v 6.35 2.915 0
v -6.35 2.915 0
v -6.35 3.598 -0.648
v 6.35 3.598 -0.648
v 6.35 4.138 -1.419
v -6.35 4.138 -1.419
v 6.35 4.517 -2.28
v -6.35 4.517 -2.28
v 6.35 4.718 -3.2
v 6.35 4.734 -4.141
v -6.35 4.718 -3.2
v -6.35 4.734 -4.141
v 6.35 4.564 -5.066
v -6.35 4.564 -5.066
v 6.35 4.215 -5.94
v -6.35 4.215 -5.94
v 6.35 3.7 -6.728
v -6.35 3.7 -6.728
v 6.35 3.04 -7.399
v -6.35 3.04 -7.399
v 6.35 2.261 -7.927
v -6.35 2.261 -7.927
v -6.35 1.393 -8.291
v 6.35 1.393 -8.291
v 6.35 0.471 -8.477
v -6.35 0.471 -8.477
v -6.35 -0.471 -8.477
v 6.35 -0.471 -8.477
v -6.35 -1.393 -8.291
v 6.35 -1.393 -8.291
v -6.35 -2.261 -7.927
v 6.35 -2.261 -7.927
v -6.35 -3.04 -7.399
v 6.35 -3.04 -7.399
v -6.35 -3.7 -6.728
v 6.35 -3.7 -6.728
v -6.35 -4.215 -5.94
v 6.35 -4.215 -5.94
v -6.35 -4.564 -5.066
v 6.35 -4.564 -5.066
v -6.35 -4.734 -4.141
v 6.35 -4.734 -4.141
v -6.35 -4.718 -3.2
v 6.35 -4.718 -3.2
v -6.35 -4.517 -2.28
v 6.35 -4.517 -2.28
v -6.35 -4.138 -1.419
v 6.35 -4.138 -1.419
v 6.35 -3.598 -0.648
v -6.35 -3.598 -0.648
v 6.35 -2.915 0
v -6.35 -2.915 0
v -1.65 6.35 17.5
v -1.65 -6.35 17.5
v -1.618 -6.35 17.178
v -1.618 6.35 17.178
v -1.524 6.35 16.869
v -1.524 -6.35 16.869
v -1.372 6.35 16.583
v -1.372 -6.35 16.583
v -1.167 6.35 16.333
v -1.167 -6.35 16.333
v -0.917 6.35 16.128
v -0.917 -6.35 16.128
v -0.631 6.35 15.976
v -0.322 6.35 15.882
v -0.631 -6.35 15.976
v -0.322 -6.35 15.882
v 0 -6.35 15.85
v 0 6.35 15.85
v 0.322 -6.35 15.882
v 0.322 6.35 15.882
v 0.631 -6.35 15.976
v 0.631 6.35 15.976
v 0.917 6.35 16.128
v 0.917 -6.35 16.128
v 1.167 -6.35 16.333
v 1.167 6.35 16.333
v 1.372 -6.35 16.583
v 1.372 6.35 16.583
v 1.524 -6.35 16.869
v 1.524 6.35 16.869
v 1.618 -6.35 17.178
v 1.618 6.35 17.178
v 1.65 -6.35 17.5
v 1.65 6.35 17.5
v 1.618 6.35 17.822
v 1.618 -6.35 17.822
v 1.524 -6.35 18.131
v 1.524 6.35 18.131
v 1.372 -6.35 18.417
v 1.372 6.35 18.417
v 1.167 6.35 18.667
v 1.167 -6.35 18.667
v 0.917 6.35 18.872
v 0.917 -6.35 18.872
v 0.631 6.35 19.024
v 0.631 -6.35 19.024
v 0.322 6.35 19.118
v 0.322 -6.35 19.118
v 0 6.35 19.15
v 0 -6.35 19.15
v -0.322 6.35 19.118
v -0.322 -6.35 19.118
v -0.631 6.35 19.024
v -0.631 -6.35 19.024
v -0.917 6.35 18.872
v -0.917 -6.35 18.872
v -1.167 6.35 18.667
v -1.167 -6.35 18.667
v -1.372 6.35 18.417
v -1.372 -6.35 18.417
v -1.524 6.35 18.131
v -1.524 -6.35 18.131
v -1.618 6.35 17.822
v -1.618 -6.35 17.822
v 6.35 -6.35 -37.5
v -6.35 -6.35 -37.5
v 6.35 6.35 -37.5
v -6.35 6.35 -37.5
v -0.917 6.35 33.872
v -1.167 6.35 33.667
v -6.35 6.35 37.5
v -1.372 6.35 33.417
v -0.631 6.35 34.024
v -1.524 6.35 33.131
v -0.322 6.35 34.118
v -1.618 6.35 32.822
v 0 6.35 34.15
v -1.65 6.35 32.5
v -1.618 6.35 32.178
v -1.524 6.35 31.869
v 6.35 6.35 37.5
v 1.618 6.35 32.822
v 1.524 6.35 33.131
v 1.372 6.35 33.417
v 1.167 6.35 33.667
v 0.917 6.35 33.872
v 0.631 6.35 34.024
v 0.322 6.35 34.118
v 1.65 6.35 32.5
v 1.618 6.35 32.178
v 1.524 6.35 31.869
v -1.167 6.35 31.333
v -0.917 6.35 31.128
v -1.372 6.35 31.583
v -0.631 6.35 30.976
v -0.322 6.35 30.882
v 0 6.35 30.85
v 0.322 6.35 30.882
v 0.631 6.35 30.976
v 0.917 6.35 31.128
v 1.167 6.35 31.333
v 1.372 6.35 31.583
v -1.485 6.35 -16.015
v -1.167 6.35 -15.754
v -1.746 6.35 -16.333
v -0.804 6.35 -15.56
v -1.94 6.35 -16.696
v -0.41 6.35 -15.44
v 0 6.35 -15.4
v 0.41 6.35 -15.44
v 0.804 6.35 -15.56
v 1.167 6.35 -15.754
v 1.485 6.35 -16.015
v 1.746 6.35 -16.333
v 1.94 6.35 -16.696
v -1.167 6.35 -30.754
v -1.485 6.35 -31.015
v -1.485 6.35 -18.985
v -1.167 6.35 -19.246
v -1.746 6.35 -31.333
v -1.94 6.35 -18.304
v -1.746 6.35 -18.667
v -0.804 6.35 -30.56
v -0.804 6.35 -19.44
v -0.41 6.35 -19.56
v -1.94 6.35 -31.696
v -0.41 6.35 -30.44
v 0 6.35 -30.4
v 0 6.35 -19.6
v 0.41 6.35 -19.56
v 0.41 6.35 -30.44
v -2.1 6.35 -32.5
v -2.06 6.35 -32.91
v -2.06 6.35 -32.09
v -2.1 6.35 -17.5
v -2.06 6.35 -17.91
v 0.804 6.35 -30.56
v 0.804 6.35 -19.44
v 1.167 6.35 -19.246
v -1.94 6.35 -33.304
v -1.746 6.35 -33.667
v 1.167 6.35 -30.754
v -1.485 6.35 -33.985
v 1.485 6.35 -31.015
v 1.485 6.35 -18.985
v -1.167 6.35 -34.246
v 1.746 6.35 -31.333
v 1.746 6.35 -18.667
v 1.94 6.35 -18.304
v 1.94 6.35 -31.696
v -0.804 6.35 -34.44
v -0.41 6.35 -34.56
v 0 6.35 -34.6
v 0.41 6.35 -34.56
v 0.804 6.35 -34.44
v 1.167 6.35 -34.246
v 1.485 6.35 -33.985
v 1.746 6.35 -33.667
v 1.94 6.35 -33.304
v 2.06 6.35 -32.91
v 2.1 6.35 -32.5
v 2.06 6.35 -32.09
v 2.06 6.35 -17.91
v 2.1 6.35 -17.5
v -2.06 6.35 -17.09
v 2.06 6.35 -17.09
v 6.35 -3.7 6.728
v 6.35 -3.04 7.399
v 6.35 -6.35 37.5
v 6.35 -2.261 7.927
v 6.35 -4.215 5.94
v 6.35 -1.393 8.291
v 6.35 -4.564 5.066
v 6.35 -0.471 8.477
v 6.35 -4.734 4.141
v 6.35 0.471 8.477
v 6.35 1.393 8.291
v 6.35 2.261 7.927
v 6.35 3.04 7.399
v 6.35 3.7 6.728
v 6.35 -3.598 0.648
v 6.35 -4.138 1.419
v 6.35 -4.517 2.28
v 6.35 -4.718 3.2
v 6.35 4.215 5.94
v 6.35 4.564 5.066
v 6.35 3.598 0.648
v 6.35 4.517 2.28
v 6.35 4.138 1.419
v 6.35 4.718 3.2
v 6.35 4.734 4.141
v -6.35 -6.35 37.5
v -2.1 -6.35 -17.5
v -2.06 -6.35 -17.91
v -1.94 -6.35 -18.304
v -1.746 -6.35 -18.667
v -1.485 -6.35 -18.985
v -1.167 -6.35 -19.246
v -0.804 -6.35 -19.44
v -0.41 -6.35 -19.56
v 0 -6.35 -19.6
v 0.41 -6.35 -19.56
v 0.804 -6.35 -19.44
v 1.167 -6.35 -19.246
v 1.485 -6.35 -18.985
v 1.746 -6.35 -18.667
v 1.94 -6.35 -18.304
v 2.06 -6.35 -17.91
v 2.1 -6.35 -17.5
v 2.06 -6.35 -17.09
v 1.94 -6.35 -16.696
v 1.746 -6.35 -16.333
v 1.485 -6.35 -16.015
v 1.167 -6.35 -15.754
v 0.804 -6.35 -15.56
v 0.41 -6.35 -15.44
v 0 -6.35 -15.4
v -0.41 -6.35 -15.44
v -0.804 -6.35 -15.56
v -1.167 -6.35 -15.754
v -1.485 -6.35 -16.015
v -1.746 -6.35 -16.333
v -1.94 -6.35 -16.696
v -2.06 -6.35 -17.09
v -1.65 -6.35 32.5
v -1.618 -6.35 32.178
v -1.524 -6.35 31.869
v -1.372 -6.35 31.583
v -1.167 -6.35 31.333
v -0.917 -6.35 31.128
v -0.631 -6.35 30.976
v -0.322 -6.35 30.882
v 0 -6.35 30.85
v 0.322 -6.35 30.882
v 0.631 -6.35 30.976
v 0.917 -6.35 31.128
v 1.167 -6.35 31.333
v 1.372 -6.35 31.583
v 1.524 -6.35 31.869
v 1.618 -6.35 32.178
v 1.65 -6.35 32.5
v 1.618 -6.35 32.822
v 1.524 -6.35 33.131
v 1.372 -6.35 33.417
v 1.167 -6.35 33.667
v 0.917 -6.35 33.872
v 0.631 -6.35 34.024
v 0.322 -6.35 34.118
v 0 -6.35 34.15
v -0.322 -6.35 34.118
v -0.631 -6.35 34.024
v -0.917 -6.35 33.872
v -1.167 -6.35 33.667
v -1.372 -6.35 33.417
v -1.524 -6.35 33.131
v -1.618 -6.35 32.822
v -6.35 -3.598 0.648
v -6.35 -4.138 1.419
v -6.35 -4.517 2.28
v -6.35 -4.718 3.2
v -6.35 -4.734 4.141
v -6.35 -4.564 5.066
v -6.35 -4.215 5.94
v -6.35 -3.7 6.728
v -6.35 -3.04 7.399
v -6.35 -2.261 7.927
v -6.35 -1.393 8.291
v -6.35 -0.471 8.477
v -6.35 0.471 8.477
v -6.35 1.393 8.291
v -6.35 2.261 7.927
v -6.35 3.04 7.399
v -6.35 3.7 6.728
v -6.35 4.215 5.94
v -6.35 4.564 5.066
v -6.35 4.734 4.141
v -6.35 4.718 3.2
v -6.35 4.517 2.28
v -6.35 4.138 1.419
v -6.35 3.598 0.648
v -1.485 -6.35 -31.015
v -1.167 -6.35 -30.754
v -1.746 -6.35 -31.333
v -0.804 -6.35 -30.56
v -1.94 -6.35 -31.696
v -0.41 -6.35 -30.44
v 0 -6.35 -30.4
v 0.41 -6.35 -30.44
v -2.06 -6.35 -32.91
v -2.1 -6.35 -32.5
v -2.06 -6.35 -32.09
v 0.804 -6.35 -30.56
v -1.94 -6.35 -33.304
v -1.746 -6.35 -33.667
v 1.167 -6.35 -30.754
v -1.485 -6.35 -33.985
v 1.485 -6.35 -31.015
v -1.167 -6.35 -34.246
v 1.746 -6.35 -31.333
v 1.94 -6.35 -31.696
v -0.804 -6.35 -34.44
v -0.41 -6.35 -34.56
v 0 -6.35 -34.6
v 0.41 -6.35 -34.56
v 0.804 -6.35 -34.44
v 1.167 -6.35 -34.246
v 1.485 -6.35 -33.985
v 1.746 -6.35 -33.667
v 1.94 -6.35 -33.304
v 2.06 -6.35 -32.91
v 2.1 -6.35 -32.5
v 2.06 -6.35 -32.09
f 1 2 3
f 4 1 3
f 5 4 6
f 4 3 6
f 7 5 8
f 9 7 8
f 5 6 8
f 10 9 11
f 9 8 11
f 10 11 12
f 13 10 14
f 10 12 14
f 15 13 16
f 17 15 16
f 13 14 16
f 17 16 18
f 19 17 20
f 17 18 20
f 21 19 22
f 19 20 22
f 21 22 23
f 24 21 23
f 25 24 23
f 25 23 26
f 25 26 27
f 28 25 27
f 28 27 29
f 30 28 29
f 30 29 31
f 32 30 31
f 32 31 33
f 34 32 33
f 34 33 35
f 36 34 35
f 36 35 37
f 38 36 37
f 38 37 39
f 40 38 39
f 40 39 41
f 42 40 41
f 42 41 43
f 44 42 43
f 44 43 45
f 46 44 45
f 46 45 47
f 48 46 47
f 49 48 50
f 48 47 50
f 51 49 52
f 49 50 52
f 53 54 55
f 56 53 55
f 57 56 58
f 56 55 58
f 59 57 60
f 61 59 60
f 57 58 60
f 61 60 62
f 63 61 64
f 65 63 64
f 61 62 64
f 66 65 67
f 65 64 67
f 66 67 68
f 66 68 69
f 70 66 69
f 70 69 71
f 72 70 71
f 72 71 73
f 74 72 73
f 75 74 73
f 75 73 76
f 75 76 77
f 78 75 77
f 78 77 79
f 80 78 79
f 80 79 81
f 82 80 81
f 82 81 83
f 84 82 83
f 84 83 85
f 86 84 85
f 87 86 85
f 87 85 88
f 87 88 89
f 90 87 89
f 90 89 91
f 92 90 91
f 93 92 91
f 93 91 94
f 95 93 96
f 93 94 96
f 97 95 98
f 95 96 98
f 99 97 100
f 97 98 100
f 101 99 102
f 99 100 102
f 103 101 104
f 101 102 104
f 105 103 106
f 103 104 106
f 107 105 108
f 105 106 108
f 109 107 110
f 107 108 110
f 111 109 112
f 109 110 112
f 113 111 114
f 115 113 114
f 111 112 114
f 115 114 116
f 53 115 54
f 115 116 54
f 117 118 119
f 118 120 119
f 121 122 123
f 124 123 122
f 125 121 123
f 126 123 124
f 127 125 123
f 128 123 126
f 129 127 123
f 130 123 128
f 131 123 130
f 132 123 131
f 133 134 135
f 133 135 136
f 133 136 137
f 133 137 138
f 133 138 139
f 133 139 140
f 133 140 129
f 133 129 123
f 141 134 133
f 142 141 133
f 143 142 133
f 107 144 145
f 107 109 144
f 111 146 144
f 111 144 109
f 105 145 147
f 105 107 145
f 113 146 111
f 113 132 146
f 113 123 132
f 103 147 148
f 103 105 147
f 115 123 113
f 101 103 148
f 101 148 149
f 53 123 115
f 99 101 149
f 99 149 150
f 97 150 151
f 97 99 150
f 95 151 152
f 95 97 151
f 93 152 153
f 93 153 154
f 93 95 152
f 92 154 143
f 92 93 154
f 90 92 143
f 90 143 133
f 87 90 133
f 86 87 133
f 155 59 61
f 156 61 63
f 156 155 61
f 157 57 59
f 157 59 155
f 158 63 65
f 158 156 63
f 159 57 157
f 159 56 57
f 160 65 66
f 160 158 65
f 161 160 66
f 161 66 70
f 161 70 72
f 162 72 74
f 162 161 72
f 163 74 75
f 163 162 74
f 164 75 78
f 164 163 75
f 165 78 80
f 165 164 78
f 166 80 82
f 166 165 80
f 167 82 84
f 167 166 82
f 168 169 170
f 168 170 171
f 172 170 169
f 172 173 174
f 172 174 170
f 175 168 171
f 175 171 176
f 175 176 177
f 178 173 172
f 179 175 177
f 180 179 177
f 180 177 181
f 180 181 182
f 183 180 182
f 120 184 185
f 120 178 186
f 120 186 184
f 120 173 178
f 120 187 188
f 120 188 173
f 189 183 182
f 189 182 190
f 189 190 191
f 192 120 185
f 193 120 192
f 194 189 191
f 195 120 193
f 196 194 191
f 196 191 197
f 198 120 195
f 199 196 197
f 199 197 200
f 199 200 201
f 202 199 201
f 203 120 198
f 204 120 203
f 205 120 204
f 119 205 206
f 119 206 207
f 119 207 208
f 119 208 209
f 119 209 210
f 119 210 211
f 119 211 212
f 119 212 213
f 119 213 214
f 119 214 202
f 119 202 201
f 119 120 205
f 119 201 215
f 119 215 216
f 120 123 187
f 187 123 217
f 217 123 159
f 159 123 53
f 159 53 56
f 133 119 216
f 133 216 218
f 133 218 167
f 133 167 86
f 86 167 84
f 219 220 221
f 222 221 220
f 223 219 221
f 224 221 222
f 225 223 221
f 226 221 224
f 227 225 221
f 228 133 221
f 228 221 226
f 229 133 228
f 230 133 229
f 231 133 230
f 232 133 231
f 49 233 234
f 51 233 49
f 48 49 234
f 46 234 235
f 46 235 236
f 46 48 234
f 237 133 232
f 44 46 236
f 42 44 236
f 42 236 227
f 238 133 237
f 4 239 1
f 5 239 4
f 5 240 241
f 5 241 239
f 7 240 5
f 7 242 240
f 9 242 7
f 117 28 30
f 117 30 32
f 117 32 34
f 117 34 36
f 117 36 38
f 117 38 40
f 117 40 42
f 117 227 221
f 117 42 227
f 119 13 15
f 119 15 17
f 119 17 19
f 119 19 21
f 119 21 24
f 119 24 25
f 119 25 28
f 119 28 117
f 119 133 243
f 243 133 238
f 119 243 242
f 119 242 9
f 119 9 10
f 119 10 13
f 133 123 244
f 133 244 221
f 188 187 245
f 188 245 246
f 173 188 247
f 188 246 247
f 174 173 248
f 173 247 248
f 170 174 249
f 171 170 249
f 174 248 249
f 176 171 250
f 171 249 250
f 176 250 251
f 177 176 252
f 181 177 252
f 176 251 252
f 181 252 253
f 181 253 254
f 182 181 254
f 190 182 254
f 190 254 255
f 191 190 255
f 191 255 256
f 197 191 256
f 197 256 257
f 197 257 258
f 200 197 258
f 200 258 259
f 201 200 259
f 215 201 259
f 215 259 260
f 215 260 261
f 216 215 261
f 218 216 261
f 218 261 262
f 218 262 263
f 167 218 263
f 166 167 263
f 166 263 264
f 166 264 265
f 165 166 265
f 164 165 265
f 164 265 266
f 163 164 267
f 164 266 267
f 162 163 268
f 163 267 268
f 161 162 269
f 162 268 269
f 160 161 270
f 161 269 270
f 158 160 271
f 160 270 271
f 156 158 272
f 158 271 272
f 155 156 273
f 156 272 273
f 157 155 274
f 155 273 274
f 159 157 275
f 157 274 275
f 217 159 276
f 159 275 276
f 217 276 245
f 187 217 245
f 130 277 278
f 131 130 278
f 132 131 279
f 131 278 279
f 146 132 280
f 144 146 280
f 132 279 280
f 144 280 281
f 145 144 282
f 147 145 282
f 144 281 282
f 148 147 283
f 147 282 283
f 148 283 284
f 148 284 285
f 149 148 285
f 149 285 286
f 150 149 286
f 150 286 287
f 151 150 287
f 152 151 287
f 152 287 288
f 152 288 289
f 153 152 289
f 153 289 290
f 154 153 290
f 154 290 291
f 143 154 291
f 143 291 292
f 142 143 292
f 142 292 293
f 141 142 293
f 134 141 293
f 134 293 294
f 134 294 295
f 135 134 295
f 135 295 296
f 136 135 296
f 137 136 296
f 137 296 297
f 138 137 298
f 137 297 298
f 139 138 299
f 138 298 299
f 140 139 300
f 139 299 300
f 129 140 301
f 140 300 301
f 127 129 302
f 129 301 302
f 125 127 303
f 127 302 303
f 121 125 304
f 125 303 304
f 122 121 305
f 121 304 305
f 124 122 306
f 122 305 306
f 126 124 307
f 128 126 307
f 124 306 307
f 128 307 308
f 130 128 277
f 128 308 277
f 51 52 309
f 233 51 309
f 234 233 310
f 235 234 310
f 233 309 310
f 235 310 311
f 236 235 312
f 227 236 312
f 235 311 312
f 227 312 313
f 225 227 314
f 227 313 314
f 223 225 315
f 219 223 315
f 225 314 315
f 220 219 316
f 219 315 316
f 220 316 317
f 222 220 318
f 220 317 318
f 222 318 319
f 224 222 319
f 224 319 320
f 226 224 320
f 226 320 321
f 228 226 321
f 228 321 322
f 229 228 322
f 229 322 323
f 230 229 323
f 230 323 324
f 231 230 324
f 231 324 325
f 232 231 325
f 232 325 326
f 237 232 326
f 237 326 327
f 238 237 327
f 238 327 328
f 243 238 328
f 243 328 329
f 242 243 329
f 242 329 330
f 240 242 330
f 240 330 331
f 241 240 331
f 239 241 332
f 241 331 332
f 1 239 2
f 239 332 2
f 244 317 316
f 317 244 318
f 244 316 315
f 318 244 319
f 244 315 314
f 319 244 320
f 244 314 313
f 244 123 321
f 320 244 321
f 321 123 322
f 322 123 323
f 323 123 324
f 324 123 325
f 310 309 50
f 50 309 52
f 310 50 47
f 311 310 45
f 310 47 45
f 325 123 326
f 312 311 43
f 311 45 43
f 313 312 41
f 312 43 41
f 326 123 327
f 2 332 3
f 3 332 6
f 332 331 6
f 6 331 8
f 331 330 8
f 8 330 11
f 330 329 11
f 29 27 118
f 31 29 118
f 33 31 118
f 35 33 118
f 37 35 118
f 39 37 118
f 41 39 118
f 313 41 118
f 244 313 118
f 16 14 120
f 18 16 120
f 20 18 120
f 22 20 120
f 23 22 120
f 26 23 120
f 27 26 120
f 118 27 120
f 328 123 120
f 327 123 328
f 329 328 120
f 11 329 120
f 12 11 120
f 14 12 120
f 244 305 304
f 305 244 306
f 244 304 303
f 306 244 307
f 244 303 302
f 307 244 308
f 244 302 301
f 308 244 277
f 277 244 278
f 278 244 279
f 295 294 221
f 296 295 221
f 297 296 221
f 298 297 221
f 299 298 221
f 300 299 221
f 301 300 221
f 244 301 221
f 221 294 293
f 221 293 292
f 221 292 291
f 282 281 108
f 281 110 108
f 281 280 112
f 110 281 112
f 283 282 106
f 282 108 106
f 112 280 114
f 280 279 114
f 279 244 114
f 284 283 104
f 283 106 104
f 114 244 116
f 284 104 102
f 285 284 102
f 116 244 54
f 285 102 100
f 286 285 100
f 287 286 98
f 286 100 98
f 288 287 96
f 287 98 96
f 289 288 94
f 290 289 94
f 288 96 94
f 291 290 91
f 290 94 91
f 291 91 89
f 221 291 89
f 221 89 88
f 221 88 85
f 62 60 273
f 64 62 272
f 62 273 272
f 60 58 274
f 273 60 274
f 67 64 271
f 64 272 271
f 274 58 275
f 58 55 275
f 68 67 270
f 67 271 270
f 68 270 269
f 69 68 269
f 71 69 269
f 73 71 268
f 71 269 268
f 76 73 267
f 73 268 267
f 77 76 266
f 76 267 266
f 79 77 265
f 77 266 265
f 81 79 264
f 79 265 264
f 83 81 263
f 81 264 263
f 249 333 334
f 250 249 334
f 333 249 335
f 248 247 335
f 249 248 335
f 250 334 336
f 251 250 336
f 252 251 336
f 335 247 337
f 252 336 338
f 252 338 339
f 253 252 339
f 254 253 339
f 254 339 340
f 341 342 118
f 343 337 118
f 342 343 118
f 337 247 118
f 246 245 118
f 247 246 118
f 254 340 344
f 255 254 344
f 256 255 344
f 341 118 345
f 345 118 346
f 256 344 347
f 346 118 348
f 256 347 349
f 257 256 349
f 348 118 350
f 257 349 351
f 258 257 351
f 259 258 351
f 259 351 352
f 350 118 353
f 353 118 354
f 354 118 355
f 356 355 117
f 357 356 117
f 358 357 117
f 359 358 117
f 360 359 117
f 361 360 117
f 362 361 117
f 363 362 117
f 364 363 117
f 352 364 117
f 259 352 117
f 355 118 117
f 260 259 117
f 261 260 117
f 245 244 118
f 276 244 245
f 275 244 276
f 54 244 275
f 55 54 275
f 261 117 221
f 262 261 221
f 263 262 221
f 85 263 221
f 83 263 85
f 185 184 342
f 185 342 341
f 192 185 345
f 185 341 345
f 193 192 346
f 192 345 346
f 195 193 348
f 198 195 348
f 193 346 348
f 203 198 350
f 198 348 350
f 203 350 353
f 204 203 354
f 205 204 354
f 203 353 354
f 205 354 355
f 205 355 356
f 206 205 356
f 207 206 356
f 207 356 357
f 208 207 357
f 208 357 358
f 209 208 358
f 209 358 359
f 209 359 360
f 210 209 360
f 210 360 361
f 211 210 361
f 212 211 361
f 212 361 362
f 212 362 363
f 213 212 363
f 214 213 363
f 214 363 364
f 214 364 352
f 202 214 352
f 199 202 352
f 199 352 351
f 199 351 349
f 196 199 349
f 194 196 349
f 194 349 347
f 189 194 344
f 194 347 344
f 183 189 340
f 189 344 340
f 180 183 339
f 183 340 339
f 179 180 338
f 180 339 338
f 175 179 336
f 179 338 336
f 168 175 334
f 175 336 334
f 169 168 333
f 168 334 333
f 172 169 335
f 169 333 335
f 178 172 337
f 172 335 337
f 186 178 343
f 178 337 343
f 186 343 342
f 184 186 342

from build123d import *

# Parameters (mm, degrees)
SKETCH1_W                       = 12.7
SKETCH1_H                       = 75
BOSS_EXTRUDE1_DEPTH             = 6.35
TAP_DRILL_FOR_M4X0_7_TAP1_D     = 3.3
SKETCH7_R                       = 4.75
CUT_EXTRUDE1_DEPTH              = 41.098160806
TAP_DRILL_FOR_M5X0_8_TAP1_D     = 4.2
TAP_DRILL_FOR_M5X0_8_TAP1_DEPTH = 15
TAP_DRILL_FOR_M5X0_8_TAP1_TIP   = 1.2618073


with BuildPart() as part:
    # Sketch1 → Boss-Extrude1 (new, symmetric)
    with BuildSketch(Plane(origin=(0, 0, 0), x_dir=(1, 0, 0), z_dir=(0, 1, 0))):
        Rectangle(SKETCH1_W, SKETCH1_H)
    extrude(amount=BOSS_EXTRUDE1_DEPTH, both=True)

    # Tap Drill for M4x0.7 Tap1 (through all)
    with Locations(Plane(origin=(0, 6.35, 0), x_dir=(1, 0, 0), z_dir=(0, 1, 0))):
        with Locations((0, -32.5), (0, -17.5)):
            Hole(TAP_DRILL_FOR_M4X0_7_TAP1_D / 2)

    # Sketch7 → Cut-Extrude1 (cut, through all)
    with BuildSketch(Plane.ZY.offset(6.35)):
        with Locations((-3.75, 0)):
            Circle(SKETCH7_R)
        with Locations((3.75, 0)):
            Circle(SKETCH7_R)
    extrude(amount=-CUT_EXTRUDE1_DEPTH, mode=Mode.SUBTRACT)

    # Tap Drill for M5x0.8 Tap1
    with Locations(Plane(origin=(0, 6.35, 0), x_dir=(1, 0, 0), z_dir=(0, 1, 0))):
        with Locations((0, 17.5), (0, 32.5)):
            Hole(TAP_DRILL_FOR_M5X0_8_TAP1_D / 2, depth=TAP_DRILL_FOR_M5X0_8_TAP1_DEPTH)
            with Locations((0, 0, -(TAP_DRILL_FOR_M5X0_8_TAP1_DEPTH + TAP_DRILL_FOR_M5X0_8_TAP1_TIP / 2))):  # 118° drill point
                Cone(0, TAP_DRILL_FOR_M5X0_8_TAP1_D / 2, TAP_DRILL_FOR_M5X0_8_TAP1_TIP, mode=Mode.SUBTRACT)


solid = part.part
